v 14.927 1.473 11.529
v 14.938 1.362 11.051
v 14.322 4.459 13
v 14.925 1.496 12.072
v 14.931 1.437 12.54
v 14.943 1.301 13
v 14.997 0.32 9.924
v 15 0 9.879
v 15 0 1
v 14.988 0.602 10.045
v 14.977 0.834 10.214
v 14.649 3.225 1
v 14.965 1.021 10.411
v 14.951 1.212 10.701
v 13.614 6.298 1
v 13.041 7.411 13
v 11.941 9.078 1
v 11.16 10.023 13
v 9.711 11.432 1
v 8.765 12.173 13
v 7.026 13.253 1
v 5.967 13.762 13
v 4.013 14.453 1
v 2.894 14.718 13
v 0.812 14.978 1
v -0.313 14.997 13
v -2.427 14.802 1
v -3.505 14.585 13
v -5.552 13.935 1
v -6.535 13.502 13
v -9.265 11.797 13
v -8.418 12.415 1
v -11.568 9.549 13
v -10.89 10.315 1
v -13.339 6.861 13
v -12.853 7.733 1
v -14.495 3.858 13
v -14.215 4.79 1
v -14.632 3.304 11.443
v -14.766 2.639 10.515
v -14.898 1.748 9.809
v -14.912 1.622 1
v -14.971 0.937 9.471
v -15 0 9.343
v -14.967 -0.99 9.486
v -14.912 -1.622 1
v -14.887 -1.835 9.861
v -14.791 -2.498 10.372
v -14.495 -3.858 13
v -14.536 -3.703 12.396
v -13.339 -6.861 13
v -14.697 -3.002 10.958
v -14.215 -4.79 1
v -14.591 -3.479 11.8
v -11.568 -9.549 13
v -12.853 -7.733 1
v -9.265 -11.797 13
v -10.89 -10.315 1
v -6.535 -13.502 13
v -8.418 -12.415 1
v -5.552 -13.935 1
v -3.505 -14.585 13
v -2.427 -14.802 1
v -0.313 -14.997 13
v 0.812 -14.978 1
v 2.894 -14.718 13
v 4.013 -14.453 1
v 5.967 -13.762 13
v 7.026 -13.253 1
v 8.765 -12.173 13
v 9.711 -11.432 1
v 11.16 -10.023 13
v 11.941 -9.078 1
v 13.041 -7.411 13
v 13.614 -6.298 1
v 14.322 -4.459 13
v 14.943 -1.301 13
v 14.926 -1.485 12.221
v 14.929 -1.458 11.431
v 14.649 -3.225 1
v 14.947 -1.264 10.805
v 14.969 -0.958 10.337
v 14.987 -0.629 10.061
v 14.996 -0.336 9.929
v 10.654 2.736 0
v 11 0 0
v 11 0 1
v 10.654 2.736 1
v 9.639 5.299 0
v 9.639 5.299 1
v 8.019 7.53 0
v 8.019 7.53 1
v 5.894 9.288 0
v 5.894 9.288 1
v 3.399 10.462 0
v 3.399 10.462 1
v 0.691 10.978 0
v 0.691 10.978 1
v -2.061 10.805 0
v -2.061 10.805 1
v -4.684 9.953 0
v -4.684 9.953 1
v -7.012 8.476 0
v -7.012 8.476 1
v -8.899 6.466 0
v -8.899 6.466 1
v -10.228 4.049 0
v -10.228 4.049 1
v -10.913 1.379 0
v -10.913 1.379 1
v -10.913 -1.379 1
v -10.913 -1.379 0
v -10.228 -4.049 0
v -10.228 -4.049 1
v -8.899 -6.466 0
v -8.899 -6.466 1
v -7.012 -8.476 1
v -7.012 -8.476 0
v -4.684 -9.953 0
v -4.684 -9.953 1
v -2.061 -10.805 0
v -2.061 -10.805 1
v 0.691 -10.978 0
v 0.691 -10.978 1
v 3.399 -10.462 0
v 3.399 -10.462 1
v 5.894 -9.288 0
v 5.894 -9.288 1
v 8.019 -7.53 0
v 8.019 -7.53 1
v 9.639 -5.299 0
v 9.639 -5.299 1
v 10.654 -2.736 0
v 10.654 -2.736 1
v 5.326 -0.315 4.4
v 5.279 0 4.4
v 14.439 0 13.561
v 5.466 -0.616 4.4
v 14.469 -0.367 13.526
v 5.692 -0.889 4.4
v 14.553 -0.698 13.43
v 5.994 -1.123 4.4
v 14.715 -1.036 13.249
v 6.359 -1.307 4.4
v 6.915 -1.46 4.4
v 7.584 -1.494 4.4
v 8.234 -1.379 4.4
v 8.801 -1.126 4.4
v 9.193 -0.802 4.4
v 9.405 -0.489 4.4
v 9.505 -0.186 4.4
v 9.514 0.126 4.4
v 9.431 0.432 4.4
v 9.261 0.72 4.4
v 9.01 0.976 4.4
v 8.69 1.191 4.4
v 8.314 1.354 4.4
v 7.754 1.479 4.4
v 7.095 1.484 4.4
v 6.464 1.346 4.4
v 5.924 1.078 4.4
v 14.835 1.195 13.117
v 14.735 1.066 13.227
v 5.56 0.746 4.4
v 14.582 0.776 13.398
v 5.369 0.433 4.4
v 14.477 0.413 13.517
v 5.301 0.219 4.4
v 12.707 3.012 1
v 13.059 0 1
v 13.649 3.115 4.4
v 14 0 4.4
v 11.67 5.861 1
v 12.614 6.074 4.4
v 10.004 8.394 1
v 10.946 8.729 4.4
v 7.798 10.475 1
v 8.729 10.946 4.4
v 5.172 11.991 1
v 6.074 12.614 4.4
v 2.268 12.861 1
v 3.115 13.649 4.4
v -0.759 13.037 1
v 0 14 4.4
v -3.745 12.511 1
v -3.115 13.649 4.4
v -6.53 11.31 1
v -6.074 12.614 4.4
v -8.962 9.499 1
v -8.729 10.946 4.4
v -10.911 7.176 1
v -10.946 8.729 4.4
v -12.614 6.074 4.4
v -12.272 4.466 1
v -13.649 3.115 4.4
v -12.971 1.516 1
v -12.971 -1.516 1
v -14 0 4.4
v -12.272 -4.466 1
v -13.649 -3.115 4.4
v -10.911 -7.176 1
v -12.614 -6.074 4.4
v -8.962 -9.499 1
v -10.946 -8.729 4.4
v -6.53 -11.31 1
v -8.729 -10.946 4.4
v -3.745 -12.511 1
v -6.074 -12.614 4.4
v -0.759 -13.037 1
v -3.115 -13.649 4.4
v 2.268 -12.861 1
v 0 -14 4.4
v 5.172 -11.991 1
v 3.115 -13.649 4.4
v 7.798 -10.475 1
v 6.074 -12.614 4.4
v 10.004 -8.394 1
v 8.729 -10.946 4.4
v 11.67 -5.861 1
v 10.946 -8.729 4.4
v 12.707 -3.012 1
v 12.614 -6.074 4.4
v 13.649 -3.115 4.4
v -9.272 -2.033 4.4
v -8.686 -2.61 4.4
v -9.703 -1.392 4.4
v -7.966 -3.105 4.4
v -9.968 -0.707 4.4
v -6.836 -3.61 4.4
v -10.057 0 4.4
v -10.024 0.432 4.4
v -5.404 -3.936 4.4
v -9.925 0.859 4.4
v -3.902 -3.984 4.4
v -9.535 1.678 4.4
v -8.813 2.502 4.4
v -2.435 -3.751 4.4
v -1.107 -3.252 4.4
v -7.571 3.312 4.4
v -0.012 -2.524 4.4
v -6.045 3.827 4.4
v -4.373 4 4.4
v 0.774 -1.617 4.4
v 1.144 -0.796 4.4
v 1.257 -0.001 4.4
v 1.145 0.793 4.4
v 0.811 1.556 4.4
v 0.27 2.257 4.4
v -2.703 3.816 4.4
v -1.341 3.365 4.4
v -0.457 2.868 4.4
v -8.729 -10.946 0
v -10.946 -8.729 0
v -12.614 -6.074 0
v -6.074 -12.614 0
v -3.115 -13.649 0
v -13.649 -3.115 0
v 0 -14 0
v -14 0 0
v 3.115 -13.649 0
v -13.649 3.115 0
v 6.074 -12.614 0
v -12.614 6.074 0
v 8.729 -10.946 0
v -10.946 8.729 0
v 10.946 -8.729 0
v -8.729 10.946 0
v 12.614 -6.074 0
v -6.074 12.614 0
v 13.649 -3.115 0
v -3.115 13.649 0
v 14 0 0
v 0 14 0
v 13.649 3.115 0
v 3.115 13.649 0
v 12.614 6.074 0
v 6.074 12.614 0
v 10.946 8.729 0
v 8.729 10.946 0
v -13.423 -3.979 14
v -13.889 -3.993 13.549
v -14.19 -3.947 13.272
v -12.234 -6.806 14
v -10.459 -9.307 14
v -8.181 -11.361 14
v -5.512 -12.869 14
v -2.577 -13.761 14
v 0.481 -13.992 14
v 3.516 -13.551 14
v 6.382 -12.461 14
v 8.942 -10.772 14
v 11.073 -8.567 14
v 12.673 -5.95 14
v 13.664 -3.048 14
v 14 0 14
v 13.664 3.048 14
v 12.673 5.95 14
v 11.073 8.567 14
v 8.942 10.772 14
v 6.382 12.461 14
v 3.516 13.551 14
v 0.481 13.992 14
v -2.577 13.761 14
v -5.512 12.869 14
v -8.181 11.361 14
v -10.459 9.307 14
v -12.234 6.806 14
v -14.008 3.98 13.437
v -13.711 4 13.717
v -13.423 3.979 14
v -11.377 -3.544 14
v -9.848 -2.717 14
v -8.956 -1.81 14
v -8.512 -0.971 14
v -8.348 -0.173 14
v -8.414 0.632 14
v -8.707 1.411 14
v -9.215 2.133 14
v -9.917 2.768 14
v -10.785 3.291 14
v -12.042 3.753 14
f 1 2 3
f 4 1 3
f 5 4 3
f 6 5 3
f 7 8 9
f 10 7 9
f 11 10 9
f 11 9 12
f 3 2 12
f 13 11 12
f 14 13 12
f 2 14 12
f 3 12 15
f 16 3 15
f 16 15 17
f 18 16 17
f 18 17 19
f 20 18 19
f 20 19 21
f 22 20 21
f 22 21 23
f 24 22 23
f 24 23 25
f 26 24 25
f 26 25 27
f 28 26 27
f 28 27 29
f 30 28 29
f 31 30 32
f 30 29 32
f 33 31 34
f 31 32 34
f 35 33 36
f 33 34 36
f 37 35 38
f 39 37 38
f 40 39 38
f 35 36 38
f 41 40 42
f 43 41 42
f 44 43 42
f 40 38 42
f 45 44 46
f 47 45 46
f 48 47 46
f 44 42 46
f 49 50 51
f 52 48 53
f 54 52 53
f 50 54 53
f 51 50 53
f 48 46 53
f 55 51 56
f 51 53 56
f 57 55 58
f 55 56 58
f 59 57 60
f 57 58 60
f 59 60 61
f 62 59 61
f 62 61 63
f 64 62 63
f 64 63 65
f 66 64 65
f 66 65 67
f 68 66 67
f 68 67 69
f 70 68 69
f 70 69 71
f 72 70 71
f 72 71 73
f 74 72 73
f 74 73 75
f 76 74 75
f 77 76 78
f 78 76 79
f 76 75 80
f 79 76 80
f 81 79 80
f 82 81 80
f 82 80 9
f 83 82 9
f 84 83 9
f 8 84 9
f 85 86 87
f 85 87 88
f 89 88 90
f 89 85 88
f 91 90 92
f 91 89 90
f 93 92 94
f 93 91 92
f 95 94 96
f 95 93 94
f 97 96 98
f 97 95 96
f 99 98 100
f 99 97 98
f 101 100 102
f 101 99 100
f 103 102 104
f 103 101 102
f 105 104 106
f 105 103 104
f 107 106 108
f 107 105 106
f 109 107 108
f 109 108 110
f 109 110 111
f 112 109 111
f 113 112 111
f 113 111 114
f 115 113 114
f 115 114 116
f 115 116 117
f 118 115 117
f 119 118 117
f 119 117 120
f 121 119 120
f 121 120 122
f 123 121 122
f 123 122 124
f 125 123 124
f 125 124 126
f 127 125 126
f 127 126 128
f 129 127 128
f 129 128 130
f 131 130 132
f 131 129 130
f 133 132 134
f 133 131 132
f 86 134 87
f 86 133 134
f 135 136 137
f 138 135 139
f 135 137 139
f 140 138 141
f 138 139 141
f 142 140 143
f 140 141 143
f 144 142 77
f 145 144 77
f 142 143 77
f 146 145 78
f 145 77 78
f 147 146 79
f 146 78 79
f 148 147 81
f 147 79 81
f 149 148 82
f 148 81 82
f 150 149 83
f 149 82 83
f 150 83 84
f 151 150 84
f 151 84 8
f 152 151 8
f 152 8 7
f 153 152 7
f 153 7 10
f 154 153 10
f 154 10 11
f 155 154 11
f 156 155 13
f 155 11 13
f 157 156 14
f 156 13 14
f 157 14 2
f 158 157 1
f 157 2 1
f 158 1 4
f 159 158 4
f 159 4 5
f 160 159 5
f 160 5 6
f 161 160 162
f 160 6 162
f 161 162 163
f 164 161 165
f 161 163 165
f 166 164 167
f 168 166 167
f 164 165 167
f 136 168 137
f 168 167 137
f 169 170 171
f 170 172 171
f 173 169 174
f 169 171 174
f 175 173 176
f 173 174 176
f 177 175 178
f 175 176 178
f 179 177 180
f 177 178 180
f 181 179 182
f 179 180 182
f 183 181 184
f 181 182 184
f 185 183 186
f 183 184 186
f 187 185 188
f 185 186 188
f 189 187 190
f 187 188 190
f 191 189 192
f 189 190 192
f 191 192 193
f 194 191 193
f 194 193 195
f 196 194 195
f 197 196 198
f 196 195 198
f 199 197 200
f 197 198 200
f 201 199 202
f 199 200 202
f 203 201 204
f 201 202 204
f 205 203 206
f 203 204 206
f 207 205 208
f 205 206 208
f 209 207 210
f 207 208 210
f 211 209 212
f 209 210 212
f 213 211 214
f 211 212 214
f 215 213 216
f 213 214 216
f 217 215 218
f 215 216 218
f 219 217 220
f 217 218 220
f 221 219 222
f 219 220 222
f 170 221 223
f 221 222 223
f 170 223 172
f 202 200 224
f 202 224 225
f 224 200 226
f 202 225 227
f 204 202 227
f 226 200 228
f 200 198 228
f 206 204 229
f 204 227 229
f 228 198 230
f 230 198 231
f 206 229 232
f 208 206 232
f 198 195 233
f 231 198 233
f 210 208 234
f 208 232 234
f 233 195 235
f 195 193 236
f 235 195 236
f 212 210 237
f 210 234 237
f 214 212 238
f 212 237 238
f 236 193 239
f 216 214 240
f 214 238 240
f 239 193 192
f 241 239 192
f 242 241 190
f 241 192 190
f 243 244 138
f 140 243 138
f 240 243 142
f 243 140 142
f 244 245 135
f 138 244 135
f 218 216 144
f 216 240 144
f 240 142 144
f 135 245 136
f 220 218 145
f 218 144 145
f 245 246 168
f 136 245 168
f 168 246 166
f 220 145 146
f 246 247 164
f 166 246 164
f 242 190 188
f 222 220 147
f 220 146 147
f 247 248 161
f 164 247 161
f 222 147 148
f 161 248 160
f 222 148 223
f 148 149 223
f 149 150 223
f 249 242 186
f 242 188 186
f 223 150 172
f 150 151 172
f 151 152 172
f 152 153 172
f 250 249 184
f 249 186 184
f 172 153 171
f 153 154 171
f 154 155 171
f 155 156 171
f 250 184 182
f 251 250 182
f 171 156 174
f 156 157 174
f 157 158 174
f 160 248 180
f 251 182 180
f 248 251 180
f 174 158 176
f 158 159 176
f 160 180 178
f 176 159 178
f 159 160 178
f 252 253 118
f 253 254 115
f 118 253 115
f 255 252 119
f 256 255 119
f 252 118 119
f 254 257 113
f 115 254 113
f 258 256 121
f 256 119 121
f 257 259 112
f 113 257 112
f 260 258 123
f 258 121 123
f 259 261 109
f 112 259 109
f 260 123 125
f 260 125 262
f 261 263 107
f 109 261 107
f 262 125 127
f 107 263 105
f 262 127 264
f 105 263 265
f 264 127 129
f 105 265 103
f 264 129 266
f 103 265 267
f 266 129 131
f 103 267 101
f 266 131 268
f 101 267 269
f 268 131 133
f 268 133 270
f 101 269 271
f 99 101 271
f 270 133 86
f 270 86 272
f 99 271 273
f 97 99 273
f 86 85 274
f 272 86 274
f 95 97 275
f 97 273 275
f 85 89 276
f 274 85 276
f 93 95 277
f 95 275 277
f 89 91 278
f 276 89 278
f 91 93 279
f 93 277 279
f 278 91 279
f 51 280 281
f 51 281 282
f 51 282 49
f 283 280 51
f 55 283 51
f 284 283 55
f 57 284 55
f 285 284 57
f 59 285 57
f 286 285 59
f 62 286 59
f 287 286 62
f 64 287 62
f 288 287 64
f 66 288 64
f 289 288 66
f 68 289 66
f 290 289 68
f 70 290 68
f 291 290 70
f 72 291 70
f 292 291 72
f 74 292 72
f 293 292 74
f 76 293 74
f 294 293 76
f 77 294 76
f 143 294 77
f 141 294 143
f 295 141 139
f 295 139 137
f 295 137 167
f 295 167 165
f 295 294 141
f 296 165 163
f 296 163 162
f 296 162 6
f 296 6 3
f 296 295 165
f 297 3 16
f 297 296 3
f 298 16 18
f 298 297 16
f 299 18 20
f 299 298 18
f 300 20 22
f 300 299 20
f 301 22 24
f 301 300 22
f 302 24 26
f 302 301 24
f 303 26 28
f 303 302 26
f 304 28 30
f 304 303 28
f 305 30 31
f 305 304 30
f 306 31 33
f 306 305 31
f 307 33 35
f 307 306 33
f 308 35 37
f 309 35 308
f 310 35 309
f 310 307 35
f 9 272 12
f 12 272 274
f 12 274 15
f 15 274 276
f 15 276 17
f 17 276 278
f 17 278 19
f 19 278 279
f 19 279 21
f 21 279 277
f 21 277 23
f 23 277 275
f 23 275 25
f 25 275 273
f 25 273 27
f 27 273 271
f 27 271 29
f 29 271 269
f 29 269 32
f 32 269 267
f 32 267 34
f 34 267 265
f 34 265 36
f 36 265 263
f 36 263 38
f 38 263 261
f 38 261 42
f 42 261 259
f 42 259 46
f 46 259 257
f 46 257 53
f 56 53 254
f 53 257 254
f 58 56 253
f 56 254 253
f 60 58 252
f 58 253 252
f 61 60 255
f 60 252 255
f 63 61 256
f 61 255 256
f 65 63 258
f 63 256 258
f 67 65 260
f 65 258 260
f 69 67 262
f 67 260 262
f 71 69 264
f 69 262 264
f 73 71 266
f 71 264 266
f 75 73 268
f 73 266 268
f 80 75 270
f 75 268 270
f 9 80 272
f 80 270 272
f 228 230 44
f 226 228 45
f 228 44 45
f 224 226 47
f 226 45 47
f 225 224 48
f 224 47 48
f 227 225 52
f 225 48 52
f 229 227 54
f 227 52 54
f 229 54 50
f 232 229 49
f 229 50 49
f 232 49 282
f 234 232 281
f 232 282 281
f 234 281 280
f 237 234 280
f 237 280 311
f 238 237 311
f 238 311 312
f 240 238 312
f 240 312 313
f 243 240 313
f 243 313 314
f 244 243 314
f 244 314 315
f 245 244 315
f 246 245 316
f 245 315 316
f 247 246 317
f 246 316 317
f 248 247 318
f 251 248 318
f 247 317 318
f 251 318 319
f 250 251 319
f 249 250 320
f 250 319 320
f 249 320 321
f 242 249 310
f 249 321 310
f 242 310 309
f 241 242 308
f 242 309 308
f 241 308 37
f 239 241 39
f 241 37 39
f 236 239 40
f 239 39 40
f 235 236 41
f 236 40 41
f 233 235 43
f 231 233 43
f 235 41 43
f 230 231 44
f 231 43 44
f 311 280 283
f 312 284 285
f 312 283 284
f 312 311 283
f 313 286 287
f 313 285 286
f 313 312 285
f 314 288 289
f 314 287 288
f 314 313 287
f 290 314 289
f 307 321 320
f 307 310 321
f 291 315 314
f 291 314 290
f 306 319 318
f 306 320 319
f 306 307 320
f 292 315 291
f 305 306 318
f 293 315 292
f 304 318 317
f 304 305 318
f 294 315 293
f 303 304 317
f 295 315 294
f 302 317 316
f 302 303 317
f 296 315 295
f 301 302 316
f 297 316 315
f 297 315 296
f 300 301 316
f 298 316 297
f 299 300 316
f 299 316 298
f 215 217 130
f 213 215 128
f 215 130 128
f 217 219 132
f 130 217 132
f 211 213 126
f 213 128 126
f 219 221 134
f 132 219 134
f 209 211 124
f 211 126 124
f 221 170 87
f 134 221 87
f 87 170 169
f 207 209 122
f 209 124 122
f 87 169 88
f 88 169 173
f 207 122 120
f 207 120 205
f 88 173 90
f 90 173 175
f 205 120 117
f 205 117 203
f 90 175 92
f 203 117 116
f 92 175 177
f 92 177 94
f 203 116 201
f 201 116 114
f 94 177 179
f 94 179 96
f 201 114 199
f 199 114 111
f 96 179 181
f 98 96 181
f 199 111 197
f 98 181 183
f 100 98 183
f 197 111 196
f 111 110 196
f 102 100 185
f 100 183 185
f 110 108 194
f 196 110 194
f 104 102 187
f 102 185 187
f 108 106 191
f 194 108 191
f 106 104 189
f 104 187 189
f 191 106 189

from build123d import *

# Parameters (mm, degrees)
F0_R     = 15
F1_DEPTH = 14
F2_SIZE  = 1
F3_R     = 11
F4_DEPTH = 4.4
F10_D    = 8
F13_D    = 3


with BuildPart() as f1:
    # F0 (on Top) → F1 (new body)
    with BuildSketch(Plane.XY):
        Circle(F0_R)
    extrude(amount=F1_DEPTH)

    # F2
    f2_edges = [f1.edges().sort_by_distance(p)[0] for p in [
        (-15, 0, 14),
        (-15, 0, 0),
    ]]
    chamfer(f2_edges, length=F2_SIZE)

    # F3 (on Top) → F4 (cut)
    with BuildSketch(Plane.XY):
        Circle(F3_R)
    extrude(amount=F4_DEPTH, mode=Mode.SUBTRACT)

    # F5 (on Front) → F6 (revolve, cut)
    with BuildSketch(Plane.XZ):
        Polygon((14, 4.4), (11, 4.4), (11, 1), (13.05913, 1), align=None)
    revolve(axis=Axis((0, 0, 2.2), (0, 0, 1)), mode=Mode.SUBTRACT)

    # F10 (through all)
    with Locations(Plane(origin=(0, 0, 0), x_dir=(0.707107, 0, 0.707107), z_dir=(0.707107, 0, -0.707107))):
        with Locations((0, 0)):
            Hole(F10_D / 2)

    # F13 (through all)
    with Locations(Plane(origin=(1.5, 0, 1.5), x_dir=(0.707107, 0, -0.707107), z_dir=(-0.707107, 0, -0.707107))):
        with Locations((2.12132, 0)):
            Hole(F13_D / 2)


solid = f1.part
